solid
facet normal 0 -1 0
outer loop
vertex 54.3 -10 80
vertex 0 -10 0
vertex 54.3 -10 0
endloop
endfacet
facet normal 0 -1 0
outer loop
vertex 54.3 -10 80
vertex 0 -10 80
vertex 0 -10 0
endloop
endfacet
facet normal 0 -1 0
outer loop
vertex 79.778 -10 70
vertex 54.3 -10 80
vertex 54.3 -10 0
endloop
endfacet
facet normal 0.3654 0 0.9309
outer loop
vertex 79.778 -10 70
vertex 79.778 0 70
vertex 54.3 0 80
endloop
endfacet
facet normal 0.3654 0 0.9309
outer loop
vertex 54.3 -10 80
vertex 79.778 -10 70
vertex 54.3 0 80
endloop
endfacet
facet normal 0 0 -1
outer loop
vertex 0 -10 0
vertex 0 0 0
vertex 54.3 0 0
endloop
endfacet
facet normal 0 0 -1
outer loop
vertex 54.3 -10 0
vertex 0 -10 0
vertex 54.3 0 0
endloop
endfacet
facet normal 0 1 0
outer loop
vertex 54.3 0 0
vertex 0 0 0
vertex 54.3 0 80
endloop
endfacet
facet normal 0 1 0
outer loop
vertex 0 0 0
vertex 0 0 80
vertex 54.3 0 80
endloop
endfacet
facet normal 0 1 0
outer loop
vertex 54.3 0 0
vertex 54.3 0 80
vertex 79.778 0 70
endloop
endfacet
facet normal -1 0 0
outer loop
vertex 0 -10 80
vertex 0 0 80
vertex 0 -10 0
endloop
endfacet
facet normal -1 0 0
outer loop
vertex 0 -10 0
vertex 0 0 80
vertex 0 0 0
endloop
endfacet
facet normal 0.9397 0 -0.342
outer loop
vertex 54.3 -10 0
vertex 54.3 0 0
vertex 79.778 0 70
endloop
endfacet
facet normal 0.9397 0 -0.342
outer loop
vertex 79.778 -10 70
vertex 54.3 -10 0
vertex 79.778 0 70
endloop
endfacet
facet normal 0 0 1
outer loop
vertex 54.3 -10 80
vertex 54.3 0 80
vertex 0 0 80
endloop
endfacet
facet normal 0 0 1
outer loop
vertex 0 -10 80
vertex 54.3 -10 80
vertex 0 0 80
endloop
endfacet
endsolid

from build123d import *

# Parameters (mm, degrees)
PAD_DEPTH               = 10
PADBODY_PLACEMENT_ANGLE = 90


with BuildPart() as part:
    # Sketch → Pad (new body)
    with BuildSketch(Plane.XY):
        Polygon((0, 0), (54.3, 0), (79.777916, 70), (54.3, 80), (0, 80), align=None)
    extrude(amount=PAD_DEPTH)


with BuildPart() as part_1:
    # PadBody placement: moved
    add(part.part.rotate(Axis((0, 0, 0), (1, 0, 0)), PADBODY_PLACEMENT_ANGLE))


solid = part_1.part
